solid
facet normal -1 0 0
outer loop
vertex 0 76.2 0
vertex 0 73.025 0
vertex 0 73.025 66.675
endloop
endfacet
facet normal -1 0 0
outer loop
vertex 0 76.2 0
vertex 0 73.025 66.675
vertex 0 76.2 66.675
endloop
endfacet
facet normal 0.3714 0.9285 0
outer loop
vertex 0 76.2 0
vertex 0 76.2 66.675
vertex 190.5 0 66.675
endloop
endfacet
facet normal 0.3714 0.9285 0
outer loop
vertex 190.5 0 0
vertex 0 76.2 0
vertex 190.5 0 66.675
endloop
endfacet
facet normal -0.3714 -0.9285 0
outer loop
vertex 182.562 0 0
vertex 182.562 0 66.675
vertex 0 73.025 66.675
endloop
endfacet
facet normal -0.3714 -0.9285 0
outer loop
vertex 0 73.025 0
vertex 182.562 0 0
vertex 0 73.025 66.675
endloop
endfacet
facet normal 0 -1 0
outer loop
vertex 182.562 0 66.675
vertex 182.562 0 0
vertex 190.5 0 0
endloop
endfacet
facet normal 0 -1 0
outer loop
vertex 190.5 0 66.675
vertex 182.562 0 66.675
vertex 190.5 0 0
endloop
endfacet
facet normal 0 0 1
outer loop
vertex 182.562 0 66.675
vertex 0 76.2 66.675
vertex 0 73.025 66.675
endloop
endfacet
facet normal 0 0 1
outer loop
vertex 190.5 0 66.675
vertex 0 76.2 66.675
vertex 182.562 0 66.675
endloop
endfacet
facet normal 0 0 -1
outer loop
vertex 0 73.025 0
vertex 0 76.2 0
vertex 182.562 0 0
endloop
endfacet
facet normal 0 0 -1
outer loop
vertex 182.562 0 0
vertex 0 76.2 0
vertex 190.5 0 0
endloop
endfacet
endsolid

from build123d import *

# Parameters (mm, degrees)
F0_W     = 190.5
F0_H     = 76.2
F1_DEPTH = 66.675
F3_DEPTH = 76.2
F5_DEPTH = 76.2


with BuildPart() as f1:
    # F0 (on Top) → F1 (new body)
    with BuildSketch(Plane.XY):
        with Locations((95.25, 38.1)):
            Rectangle(F0_W, F0_H)
    extrude(amount=F1_DEPTH)

    # F2 (on face) → F3 (cut)
    with BuildSketch(Plane.XY.offset(66.675)):
        Polygon((0, 76.2), (190.5, 0), (190.5, 76.2), align=None)
    extrude(amount=-F3_DEPTH, mode=Mode.SUBTRACT)

    # F4 (on face) → F5 (cut)
    with BuildSketch(Plane.XY.offset(66.675)):
        Polygon((182.5625, 0), (0, 73.025), (0, 0), align=None)
    extrude(amount=-F5_DEPTH, mode=Mode.SUBTRACT)


solid = f1.part
